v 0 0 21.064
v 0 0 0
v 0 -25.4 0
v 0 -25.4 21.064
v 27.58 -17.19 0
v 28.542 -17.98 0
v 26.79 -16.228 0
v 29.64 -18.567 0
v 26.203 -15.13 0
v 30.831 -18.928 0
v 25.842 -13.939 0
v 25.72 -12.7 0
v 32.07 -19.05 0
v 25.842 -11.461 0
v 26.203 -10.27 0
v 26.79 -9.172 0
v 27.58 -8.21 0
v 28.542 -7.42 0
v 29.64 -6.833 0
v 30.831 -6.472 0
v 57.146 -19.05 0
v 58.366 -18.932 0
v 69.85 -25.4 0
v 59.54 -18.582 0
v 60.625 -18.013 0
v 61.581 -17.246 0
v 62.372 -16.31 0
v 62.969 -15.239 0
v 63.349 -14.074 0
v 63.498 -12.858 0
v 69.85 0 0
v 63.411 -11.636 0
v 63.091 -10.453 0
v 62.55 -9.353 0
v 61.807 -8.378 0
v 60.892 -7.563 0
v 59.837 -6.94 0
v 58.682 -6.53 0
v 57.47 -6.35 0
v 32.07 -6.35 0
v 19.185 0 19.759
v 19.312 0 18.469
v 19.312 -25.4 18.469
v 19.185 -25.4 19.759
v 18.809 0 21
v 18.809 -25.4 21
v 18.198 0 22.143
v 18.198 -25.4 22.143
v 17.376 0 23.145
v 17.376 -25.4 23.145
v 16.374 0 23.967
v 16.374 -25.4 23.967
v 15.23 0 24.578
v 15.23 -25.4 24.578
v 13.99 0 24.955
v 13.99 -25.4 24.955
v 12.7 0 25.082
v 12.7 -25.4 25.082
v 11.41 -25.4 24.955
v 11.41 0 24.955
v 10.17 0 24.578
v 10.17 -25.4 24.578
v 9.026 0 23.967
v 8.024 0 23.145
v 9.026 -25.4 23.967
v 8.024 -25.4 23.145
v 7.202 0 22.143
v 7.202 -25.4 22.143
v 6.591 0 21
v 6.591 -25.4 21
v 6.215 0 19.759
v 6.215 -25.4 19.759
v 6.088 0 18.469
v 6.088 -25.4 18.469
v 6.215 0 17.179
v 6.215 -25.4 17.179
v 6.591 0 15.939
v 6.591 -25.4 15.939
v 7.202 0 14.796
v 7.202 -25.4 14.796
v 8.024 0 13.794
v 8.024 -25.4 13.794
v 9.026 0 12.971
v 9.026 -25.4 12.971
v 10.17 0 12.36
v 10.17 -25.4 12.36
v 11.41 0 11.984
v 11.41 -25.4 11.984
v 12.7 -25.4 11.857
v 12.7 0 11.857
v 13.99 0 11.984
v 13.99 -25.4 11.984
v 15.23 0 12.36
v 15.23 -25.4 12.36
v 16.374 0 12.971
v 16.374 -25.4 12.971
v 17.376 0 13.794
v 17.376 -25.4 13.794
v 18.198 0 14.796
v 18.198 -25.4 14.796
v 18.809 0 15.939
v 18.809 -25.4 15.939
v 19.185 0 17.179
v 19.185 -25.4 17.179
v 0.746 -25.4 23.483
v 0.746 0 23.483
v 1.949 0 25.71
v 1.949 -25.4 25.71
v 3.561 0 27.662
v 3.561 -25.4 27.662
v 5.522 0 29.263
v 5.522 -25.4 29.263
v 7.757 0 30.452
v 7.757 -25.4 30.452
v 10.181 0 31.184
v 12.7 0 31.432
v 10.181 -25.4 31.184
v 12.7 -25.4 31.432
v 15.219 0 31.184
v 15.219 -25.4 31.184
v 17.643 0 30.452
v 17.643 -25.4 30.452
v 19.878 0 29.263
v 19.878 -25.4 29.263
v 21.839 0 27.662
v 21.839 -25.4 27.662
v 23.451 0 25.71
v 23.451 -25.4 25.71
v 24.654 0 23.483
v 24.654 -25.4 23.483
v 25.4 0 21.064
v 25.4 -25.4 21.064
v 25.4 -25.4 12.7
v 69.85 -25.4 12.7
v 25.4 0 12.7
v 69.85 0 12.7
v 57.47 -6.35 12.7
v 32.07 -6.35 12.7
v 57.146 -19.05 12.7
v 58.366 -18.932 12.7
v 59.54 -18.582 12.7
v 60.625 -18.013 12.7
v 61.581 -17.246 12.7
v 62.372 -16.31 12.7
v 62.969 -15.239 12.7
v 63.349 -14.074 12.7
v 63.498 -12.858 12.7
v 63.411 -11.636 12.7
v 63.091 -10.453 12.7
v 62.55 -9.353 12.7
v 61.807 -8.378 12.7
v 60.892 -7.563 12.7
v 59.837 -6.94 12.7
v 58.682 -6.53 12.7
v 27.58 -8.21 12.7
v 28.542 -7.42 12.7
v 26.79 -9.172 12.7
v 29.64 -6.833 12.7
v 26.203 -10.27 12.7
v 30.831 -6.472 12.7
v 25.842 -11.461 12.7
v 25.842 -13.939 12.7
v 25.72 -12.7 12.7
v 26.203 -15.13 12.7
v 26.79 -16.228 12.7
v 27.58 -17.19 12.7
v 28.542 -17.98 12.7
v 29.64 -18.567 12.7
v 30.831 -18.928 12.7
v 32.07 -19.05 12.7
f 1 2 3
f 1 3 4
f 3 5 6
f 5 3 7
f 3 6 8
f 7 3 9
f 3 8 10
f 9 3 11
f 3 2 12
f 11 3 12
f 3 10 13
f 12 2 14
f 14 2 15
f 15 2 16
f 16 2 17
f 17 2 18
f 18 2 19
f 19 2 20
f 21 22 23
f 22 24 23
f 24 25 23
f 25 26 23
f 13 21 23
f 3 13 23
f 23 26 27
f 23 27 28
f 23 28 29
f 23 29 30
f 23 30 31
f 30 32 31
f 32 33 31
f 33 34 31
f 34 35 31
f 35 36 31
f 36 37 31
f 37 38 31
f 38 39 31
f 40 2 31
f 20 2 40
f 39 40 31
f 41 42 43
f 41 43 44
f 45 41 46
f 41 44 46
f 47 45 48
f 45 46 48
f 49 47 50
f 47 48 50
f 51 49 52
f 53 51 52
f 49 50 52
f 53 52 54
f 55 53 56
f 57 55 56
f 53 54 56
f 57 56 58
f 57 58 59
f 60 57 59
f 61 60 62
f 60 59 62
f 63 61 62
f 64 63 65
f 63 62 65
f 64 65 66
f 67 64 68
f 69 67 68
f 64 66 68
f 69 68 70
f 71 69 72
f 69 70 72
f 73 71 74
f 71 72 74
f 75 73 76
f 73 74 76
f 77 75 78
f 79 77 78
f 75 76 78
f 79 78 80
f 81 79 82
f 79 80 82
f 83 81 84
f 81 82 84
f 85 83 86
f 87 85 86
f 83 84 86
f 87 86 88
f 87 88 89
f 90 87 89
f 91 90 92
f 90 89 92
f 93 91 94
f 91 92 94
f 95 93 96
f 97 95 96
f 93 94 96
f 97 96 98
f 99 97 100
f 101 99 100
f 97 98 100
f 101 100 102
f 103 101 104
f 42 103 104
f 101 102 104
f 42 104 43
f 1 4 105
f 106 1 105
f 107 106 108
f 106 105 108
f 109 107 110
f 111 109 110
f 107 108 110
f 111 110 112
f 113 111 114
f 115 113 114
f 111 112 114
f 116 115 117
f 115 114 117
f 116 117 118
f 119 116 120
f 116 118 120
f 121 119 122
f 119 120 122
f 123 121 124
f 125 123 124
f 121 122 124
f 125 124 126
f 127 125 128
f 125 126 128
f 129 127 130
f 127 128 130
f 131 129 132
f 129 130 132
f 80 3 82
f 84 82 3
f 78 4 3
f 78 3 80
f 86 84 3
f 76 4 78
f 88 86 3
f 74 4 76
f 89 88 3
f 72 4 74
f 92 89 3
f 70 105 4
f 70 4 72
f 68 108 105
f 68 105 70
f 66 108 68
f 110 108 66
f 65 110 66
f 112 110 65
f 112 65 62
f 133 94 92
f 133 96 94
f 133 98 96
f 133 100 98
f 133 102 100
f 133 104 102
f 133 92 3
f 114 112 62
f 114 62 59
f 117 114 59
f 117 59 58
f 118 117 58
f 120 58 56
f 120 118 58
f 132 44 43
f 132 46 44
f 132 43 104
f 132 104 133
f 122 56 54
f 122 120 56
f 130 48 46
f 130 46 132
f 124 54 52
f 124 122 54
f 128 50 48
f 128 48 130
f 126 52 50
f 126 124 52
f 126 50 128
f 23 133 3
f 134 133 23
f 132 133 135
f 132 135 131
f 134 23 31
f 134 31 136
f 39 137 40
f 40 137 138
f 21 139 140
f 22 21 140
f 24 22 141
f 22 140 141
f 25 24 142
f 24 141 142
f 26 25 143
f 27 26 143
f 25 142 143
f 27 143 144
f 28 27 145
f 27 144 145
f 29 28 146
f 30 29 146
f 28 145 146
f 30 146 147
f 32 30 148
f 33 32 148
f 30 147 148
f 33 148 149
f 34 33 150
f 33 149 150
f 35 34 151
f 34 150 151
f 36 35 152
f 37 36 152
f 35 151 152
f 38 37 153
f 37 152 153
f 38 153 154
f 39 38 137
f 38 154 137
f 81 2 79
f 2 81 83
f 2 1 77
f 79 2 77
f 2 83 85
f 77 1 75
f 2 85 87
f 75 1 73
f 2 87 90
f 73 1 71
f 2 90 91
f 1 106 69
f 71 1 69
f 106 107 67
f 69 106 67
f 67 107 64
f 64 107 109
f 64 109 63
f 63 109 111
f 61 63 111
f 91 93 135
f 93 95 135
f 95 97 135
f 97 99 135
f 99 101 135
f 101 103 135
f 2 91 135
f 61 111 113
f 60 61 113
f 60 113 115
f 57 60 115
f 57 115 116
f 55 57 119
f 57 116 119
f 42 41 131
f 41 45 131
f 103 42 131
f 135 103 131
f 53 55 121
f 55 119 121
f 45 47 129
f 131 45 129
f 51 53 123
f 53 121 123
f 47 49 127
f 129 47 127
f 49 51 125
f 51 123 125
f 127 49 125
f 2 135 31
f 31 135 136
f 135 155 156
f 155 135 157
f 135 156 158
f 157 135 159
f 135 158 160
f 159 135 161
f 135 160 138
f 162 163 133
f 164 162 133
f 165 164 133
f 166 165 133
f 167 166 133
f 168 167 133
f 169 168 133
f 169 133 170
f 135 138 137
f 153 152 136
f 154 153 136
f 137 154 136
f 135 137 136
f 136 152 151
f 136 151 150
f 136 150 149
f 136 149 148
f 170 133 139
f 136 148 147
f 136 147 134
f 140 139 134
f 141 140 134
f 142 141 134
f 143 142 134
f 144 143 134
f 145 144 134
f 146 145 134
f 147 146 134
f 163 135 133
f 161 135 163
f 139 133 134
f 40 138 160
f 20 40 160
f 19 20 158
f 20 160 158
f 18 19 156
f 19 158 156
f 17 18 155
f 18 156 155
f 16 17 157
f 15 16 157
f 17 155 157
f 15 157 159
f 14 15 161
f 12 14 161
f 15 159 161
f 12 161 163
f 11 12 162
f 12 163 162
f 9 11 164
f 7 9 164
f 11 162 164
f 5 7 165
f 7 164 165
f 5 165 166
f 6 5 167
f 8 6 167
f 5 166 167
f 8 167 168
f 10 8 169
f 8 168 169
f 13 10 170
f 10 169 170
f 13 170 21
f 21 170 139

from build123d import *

# Parameters (mm, degrees)
F0_W      = 69.85
F0_H      = 31.75
F1_DEPTH  = 25.4
F2_W      = 44.45
F2_H      = 19.05
F3_DEPTH  = 25.4
F5_DEPTH  = 25.4
F6_R      = 6.6122667184
F7_DEPTH  = 25.4
F9_DEPTH  = 25.4
F11_DEPTH = 25.4


with BuildPart() as f1:
    # F0 (on Front) → F1 (new body)
    with BuildSketch(Plane.XZ):
        with Locations((34.925, 15.875)):
            Rectangle(F0_W, F0_H)
    extrude(amount=F1_DEPTH)

    # F2 (on face) → F3 (cut)
    with BuildSketch(Plane.XZ.offset(25.4)):
        with Locations((47.625, 22.225)):
            Rectangle(F2_W, F2_H)
    extrude(amount=-F3_DEPTH, mode=Mode.SUBTRACT)

    # F4 (on face) → F5 (cut)
    with BuildSketch(Plane.XZ.offset(25.4)):
        with BuildLine():
            ThreePointArc((0, 21.06358689), (12.7, 31.4315601634), (25.4, 21.06358689))
            Line((25.4, 21.06358689), (25.4, 31.75))
            Line((25.4, 31.75), (0, 31.75))
            Line((0, 31.75), (0, 21.06358689))
        make_face()
    extrude(amount=-F5_DEPTH, mode=Mode.SUBTRACT)

    # F6 (on face) → F7 (cut)
    with BuildSketch(Plane.XZ.offset(25.4)):
        with Locations((12.7, 18.469293445)):
            Circle(F6_R)
    extrude(amount=-F7_DEPTH, mode=Mode.SUBTRACT)

    # F8 (on face) → F9 (cut)
    with BuildSketch(Plane.XY.offset(12.7)):
        with BuildLine():
            Line((57.4697845539, -6.35), (32.0697845539, -6.35))
            ThreePointArc((32.0697845539, -6.35), (25.7197845539, -12.7), (32.0697845539, -19.05))
            Line((32.0697845539, -19.05), (57.1458699361, -19.05))
            ThreePointArc((57.1458699361, -19.05), (63.4979349681, -12.8578792423), (57.4697845539, -6.35))
        make_face()
    extrude(amount=-F9_DEPTH, mode=Mode.SUBTRACT)

    # F10 (on face) → F11 (cut)
    with BuildSketch(Plane.XY.offset(12.7)):
        with BuildLine():
            ThreePointArc((59.4271533191, 0), (69.7393281639, -11.6319730082), (62.5223219395, -25.4))
            Line((62.5223219395, -25.4), (69.85, -25.4))
            Line((69.85, -25.4), (69.85, 0))
            Line((69.85, 0), (59.4271533191, 0))
        make_face()
    extrude(amount=F11_DEPTH, mode=Mode.SUBTRACT)


solid = f1.part
